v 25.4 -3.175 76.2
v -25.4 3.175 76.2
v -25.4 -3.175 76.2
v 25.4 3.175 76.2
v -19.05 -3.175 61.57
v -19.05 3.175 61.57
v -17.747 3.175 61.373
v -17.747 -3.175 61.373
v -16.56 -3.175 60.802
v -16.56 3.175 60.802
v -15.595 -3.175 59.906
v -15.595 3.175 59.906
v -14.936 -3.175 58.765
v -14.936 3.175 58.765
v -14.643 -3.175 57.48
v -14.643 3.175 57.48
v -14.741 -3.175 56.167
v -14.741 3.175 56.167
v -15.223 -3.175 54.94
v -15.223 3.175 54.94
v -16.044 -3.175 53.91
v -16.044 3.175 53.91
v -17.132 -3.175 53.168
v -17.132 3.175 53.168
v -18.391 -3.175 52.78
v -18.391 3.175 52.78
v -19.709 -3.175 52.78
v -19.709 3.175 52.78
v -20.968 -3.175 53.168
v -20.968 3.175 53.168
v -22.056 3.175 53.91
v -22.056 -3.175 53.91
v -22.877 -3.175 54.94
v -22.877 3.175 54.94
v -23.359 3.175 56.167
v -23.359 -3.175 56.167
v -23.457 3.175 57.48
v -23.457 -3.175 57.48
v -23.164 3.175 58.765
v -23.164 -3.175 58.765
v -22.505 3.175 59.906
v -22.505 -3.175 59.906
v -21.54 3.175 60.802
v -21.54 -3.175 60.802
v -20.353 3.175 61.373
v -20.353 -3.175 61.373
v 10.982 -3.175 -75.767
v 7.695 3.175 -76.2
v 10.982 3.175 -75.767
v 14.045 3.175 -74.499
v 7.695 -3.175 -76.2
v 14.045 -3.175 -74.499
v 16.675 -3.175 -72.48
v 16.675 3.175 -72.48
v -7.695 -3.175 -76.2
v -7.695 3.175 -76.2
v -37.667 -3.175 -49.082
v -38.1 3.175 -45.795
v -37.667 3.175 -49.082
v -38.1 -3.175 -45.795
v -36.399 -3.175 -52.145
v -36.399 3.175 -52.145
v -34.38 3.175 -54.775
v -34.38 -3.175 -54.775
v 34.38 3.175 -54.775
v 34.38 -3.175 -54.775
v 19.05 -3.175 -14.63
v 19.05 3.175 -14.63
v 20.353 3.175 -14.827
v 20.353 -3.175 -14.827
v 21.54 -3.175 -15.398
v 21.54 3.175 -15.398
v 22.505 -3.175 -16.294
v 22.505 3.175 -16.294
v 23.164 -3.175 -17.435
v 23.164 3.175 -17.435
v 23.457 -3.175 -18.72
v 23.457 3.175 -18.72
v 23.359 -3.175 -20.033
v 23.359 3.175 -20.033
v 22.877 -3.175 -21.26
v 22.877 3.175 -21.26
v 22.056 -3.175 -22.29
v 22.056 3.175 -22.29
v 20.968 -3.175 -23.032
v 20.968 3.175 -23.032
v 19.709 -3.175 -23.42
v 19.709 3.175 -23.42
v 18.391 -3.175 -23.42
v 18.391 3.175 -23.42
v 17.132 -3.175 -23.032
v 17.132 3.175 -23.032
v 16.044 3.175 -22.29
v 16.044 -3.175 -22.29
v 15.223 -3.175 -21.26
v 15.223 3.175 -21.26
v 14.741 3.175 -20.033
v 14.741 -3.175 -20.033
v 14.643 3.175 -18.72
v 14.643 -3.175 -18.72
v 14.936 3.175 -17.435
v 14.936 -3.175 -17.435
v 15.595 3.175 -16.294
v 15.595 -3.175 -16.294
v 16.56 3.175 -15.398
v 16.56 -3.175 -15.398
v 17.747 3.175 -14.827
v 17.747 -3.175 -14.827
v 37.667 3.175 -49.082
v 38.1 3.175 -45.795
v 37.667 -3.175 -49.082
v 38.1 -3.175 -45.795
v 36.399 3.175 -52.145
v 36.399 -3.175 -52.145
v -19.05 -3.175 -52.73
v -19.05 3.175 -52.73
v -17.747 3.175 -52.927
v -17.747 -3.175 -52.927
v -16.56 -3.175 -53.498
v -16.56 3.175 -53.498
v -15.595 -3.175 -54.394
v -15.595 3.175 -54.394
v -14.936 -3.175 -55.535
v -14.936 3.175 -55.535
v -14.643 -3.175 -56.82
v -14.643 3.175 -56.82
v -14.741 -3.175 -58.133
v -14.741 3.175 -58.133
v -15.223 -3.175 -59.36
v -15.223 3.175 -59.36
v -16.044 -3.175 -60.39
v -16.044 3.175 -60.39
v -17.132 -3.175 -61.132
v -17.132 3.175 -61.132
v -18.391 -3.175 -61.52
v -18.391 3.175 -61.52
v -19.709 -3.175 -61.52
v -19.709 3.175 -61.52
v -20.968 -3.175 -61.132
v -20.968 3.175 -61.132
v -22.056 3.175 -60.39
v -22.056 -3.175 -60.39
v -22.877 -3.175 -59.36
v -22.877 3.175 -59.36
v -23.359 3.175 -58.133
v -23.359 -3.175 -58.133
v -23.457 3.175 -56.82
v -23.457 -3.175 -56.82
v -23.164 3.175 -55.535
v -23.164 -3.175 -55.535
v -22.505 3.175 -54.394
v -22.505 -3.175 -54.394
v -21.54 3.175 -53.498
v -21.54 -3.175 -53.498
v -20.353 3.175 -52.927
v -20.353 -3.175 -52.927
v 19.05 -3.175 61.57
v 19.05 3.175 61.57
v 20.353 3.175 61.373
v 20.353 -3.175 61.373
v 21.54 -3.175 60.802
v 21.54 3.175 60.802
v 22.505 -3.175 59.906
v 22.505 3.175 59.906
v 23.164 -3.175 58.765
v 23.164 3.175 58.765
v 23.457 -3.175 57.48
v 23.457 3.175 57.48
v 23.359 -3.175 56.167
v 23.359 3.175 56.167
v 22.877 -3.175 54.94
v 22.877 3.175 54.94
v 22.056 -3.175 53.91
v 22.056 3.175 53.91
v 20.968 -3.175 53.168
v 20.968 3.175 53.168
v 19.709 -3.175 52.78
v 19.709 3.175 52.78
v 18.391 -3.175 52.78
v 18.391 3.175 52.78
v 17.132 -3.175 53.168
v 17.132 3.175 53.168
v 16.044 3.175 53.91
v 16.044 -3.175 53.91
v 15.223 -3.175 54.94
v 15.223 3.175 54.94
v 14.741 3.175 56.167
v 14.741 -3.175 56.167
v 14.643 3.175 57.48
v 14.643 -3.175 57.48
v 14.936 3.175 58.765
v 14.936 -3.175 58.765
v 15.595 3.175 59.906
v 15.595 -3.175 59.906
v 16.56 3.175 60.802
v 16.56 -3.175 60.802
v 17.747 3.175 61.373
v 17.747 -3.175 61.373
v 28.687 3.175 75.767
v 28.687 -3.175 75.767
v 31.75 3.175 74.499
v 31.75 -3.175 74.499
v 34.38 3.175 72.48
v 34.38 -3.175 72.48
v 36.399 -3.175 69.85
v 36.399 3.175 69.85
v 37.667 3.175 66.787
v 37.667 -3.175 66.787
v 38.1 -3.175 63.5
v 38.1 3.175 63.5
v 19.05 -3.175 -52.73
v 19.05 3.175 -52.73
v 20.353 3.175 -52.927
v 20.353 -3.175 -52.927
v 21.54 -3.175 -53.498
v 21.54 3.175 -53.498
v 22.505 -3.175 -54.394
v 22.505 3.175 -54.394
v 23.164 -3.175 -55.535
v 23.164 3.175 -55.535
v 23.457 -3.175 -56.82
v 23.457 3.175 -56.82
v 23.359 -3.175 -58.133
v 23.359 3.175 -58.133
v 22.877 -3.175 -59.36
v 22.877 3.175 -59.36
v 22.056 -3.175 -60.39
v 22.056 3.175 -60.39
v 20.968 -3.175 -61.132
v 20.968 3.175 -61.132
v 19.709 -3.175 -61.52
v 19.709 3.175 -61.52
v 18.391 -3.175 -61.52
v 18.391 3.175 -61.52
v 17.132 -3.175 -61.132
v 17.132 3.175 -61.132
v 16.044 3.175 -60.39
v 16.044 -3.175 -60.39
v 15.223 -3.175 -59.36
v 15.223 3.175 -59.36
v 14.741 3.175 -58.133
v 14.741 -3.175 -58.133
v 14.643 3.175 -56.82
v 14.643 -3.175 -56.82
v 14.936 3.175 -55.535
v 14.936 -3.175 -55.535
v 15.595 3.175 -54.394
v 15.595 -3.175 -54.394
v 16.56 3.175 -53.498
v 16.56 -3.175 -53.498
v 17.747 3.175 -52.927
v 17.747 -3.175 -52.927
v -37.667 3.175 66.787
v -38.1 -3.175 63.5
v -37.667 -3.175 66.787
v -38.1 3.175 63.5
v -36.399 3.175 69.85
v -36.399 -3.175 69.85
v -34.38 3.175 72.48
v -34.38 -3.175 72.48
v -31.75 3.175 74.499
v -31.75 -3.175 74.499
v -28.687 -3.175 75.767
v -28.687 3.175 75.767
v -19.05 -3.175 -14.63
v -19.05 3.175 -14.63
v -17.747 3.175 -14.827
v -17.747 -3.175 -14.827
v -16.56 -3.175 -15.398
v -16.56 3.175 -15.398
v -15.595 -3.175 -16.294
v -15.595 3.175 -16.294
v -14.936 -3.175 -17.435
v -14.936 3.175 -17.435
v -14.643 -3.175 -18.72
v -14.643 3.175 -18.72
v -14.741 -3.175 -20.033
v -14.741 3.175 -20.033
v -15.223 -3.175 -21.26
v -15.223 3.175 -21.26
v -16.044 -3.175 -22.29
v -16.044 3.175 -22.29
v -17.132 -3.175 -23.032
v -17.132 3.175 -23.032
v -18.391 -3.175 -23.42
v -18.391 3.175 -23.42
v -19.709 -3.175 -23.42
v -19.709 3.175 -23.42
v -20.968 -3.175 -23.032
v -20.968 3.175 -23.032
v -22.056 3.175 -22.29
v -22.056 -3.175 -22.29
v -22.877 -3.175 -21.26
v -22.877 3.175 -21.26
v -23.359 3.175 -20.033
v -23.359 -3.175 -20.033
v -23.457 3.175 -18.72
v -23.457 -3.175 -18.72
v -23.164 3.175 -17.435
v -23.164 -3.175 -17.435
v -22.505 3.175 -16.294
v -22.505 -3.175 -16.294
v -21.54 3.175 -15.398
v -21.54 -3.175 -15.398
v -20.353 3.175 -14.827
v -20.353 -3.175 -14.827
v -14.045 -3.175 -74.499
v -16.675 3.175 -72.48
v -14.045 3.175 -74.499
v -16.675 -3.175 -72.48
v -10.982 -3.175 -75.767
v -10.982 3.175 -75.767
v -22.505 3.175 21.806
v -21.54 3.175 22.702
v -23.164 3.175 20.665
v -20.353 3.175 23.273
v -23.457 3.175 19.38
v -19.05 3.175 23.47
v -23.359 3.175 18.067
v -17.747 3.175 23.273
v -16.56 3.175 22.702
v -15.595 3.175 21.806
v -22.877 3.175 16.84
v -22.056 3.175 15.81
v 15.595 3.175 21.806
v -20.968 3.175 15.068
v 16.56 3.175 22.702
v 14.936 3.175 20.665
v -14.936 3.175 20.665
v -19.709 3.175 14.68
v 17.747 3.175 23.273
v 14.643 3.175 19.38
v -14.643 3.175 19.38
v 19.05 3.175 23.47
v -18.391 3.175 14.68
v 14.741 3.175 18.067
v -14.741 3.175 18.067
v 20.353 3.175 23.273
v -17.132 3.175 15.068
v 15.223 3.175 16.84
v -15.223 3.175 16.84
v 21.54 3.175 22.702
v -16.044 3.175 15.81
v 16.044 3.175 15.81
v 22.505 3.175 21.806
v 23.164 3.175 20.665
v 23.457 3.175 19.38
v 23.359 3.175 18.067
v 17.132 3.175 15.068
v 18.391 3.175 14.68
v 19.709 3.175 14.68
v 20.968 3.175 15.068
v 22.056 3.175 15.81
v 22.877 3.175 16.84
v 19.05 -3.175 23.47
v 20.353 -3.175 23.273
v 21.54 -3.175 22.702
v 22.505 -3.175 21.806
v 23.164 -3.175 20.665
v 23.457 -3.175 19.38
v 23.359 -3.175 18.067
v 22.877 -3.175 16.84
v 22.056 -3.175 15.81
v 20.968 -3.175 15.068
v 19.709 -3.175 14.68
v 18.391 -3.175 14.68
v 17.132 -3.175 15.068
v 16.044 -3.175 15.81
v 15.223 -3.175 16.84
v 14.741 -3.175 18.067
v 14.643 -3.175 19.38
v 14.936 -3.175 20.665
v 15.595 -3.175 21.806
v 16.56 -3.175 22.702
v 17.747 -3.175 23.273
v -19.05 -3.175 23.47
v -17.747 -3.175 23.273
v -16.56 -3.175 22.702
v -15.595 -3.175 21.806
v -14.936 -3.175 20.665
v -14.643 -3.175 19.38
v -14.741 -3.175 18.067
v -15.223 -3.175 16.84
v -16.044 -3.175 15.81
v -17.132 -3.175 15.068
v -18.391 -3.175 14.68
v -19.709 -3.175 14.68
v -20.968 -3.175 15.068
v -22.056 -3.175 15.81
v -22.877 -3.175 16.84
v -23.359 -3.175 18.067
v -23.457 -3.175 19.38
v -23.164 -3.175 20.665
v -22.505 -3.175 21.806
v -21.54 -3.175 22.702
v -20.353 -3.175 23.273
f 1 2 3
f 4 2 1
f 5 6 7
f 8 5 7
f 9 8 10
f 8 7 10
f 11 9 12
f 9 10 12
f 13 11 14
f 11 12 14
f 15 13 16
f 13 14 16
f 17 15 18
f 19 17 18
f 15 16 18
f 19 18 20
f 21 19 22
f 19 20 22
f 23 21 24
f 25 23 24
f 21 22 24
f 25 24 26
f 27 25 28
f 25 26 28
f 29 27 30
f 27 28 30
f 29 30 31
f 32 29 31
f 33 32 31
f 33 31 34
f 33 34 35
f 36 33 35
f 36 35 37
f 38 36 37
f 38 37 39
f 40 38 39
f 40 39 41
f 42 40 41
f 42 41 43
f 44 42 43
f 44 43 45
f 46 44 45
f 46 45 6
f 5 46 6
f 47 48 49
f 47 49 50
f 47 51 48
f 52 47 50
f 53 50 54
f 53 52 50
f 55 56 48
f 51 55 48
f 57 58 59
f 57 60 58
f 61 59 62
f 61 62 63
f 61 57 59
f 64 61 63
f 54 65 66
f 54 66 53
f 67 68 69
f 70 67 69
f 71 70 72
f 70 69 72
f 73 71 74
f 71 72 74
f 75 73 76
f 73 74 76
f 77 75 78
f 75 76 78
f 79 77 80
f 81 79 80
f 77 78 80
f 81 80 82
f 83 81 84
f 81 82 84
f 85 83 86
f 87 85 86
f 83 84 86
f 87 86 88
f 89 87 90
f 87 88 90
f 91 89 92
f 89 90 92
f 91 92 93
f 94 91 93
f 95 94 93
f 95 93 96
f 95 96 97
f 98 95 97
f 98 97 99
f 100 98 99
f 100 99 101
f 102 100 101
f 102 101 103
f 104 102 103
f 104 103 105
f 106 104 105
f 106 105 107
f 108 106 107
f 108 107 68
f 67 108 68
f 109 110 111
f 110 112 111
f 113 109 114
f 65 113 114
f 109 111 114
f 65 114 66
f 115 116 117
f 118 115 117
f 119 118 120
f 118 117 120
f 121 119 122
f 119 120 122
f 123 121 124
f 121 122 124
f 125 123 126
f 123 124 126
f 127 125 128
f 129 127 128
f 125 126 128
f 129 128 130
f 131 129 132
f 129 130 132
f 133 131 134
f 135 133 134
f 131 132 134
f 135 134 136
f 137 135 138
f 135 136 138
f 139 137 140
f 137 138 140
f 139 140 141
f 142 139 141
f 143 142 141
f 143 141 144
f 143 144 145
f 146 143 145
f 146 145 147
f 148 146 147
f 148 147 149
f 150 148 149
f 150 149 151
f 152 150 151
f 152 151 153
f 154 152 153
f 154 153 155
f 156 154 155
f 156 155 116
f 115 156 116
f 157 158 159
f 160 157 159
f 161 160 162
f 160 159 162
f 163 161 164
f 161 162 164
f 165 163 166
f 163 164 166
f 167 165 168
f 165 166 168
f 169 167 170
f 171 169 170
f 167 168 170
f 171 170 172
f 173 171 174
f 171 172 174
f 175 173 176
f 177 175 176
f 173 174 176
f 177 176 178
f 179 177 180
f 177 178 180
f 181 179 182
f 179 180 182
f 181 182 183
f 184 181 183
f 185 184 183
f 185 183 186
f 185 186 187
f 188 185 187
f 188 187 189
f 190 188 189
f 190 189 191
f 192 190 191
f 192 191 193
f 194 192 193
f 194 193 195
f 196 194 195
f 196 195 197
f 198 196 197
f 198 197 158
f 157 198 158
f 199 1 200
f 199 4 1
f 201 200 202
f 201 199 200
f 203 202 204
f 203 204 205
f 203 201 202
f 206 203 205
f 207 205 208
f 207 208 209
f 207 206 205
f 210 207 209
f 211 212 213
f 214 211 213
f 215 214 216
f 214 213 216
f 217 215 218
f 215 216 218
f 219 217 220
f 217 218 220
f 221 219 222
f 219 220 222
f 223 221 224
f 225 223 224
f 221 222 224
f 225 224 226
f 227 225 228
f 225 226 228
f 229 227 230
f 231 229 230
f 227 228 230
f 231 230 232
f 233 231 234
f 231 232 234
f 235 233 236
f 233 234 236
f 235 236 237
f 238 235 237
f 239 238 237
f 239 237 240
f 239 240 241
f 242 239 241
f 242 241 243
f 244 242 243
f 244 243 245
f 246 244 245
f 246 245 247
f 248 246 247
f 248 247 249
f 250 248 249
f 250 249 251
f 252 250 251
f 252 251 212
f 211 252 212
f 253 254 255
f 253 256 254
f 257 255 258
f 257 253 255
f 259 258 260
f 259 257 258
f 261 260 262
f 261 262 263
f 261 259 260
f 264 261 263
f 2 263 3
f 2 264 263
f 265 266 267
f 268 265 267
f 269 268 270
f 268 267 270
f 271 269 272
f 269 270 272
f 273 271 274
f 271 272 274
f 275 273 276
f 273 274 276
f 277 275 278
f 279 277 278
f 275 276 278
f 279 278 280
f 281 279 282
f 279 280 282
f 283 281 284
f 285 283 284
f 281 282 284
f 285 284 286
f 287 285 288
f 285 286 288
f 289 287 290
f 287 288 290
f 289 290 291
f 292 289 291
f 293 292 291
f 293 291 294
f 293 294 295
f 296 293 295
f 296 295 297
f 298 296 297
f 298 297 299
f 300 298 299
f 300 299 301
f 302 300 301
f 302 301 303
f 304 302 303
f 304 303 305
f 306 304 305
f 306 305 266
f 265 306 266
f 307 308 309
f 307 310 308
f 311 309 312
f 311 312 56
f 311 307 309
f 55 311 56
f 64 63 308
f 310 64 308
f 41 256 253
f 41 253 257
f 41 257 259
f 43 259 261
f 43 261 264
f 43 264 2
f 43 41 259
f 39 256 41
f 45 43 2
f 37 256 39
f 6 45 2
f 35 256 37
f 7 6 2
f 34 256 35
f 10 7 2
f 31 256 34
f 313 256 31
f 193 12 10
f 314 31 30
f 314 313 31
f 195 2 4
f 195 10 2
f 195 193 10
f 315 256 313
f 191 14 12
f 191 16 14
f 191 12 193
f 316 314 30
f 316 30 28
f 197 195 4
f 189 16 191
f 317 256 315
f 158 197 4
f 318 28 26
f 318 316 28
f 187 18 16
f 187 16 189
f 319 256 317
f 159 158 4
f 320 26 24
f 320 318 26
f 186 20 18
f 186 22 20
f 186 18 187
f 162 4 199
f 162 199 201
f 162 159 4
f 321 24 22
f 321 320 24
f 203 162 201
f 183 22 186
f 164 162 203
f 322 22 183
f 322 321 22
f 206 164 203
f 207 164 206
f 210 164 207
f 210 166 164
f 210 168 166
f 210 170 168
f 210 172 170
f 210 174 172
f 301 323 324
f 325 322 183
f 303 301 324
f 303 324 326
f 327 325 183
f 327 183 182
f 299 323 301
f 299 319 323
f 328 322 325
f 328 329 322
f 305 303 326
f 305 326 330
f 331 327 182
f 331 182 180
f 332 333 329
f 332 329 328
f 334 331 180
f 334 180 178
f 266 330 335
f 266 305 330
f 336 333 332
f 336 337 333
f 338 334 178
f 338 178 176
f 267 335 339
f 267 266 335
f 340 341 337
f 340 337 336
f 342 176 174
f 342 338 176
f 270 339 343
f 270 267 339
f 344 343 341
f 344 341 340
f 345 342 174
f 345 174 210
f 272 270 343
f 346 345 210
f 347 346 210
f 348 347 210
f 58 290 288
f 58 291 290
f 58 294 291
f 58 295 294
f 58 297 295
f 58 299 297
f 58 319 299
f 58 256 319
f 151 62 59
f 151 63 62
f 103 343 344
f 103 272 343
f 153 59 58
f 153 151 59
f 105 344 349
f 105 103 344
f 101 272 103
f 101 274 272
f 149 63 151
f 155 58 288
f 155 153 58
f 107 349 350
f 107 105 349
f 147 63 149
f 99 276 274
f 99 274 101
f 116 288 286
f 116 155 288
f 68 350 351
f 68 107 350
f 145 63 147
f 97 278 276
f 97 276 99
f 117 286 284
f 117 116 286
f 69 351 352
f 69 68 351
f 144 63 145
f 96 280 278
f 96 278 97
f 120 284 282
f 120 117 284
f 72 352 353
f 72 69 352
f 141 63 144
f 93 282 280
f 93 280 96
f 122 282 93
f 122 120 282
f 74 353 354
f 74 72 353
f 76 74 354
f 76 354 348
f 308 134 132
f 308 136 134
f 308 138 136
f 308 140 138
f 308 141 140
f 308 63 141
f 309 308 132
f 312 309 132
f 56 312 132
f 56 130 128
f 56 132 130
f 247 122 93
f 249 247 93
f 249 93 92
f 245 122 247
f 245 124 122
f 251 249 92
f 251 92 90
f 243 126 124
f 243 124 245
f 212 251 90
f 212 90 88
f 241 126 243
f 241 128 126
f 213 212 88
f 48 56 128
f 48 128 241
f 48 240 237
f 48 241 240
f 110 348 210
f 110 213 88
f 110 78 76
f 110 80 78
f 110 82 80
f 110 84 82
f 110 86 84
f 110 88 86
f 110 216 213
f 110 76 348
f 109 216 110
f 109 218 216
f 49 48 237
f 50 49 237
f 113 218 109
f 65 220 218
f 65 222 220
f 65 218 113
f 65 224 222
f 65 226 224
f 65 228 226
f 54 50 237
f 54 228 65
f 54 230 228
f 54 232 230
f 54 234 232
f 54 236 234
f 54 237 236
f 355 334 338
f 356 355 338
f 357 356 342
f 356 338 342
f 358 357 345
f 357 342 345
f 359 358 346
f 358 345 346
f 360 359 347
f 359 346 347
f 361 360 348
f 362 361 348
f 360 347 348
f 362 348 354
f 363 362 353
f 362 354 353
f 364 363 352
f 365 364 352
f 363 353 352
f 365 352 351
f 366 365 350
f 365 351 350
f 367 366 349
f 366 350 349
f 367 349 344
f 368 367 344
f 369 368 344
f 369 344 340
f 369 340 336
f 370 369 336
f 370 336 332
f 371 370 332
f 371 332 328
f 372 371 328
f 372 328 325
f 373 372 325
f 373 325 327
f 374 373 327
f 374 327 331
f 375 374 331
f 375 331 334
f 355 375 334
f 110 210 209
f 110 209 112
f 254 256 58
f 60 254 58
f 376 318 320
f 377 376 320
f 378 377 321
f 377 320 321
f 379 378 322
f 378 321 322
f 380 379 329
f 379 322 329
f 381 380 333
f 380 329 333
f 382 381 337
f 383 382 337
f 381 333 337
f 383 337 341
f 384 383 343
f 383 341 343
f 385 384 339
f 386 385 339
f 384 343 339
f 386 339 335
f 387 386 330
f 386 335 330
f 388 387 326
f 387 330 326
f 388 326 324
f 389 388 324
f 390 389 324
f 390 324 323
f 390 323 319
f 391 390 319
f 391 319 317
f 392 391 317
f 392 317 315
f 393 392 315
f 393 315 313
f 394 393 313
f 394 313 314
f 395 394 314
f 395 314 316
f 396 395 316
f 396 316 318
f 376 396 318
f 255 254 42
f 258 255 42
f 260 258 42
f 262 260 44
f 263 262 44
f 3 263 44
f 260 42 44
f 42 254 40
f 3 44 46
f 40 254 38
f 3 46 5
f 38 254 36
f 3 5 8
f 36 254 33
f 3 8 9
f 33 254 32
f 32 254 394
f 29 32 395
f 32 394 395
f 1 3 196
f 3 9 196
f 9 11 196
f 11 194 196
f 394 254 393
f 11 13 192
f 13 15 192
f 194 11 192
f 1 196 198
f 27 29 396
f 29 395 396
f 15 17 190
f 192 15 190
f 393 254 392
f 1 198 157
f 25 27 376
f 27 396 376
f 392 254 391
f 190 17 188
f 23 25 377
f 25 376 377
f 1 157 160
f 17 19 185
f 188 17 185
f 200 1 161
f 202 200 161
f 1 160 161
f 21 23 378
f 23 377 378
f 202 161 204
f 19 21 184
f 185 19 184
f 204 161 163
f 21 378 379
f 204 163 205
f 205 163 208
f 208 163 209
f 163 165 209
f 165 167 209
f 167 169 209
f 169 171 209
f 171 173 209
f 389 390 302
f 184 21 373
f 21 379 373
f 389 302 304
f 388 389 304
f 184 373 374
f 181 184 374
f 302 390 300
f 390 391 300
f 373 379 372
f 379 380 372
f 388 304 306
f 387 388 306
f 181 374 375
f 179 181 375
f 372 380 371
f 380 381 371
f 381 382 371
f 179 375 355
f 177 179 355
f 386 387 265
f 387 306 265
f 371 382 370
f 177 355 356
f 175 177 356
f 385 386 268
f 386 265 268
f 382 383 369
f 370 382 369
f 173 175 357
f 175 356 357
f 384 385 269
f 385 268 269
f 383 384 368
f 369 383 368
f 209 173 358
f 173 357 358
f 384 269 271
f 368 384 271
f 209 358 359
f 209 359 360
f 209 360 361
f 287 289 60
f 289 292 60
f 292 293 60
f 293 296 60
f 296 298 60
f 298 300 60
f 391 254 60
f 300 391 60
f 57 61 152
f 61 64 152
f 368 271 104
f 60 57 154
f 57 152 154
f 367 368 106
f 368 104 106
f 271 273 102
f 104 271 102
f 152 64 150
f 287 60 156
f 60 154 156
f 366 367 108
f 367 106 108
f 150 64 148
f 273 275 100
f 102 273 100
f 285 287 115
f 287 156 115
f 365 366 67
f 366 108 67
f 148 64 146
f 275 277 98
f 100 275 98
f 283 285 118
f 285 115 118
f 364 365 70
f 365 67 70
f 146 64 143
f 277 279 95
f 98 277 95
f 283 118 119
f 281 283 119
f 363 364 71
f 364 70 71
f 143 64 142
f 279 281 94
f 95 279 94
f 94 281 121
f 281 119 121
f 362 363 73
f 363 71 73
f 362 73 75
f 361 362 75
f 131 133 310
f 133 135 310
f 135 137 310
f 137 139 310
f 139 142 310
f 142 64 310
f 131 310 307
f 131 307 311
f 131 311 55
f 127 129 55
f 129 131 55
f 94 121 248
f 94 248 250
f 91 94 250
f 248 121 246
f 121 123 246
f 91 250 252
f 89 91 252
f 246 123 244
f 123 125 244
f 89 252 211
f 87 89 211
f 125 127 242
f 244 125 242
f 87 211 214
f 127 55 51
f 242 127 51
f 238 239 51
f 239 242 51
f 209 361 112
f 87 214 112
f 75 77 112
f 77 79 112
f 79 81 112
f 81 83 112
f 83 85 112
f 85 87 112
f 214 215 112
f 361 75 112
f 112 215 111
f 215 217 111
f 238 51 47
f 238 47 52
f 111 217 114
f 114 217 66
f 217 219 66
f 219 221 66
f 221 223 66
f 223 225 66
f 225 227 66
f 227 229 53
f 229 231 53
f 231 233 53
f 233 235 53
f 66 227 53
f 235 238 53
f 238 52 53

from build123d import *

# Parameters (mm, degrees)
SKETCH1_W           = 76.2
SKETCH1_H           = 152.4
BOSS_EXTRUDE1_DEPTH = 3.175
SKETCH2_R           = 4.4196
CUT_EXTRUDE1_DEPTH  = 86.430512699
CUT_EXTRUDE2_DEPTH  = 86.430512699
FILLET1_R           = 12.7


with BuildPart() as part:
    # Sketch1 → Boss-Extrude1 (new, symmetric)
    with BuildSketch(Plane(origin=(0, 0, 0), x_dir=(1, 0, 0), z_dir=(0, 1, 0))):
        Rectangle(SKETCH1_W, SKETCH1_H)
    extrude(amount=BOSS_EXTRUDE1_DEPTH, both=True)

    # Sketch2 → Cut-Extrude1 (cut, through all)
    with BuildSketch(Plane(origin=(0, 3.175, 0), x_dir=(1, 0, 0), z_dir=(0, 1, 0))):
        with Locations(Location((-19.05, 57.15, 0), (0, 0, 270))):
            Circle(SKETCH2_R)
        with Locations(Location((19.05, 57.15, 0), (0, 0, 270))):
            Circle(SKETCH2_R)
        with Locations(Location((19.05, 19.05, 0), (0, 0, 270))):
            Circle(SKETCH2_R)
        with Locations(Location((19.05, -19.05, 0), (0, 0, 270))):
            Circle(SKETCH2_R)
        with Locations(Location((19.05, -57.15, 0), (0, 0, 270))):
            Circle(SKETCH2_R)
        with Locations(Location((-19.05, 19.05, 0), (0, 0, 270))):
            Circle(SKETCH2_R)
        with Locations(Location((-19.05, -19.05, 0), (0, 0, 270))):
            Circle(SKETCH2_R)
        with Locations(Location((-19.05, -57.15, 0), (0, 0, 270))):
            Circle(SKETCH2_R)
    extrude(amount=-CUT_EXTRUDE1_DEPTH, mode=Mode.SUBTRACT)

    # Sketch3 → Cut-Extrude2 (cut, through all)
    with BuildSketch(Plane(origin=(0, 3.175, 0), x_dir=(1, 0, 0), z_dir=(0, 1, 0))):
        Polygon((-38.1, 51.055282861), (-12.955282861, 76.2), (-38.1, 76.2), align=None)
        Polygon((12.955282861, 76.2), (38.1, 76.2), (38.1, 51.055282861), align=None)
    extrude(amount=-CUT_EXTRUDE2_DEPTH, mode=Mode.SUBTRACT)

    # Fillet1
    fillet1_edges = [part.edges().sort_by_distance(p)[0] for p in [
        (-38.1, 0, -51.055282861),
        (-12.955282861, 0, -76.2),
        (38.1, 0, -51.055282861),
        (12.955282861, 0, -76.2),
        (38.1, 0, 76.2),
        (-38.1, 0, 76.2),
    ]]
    fillet(fillet1_edges, radius=FILLET1_R)


solid = part.part
